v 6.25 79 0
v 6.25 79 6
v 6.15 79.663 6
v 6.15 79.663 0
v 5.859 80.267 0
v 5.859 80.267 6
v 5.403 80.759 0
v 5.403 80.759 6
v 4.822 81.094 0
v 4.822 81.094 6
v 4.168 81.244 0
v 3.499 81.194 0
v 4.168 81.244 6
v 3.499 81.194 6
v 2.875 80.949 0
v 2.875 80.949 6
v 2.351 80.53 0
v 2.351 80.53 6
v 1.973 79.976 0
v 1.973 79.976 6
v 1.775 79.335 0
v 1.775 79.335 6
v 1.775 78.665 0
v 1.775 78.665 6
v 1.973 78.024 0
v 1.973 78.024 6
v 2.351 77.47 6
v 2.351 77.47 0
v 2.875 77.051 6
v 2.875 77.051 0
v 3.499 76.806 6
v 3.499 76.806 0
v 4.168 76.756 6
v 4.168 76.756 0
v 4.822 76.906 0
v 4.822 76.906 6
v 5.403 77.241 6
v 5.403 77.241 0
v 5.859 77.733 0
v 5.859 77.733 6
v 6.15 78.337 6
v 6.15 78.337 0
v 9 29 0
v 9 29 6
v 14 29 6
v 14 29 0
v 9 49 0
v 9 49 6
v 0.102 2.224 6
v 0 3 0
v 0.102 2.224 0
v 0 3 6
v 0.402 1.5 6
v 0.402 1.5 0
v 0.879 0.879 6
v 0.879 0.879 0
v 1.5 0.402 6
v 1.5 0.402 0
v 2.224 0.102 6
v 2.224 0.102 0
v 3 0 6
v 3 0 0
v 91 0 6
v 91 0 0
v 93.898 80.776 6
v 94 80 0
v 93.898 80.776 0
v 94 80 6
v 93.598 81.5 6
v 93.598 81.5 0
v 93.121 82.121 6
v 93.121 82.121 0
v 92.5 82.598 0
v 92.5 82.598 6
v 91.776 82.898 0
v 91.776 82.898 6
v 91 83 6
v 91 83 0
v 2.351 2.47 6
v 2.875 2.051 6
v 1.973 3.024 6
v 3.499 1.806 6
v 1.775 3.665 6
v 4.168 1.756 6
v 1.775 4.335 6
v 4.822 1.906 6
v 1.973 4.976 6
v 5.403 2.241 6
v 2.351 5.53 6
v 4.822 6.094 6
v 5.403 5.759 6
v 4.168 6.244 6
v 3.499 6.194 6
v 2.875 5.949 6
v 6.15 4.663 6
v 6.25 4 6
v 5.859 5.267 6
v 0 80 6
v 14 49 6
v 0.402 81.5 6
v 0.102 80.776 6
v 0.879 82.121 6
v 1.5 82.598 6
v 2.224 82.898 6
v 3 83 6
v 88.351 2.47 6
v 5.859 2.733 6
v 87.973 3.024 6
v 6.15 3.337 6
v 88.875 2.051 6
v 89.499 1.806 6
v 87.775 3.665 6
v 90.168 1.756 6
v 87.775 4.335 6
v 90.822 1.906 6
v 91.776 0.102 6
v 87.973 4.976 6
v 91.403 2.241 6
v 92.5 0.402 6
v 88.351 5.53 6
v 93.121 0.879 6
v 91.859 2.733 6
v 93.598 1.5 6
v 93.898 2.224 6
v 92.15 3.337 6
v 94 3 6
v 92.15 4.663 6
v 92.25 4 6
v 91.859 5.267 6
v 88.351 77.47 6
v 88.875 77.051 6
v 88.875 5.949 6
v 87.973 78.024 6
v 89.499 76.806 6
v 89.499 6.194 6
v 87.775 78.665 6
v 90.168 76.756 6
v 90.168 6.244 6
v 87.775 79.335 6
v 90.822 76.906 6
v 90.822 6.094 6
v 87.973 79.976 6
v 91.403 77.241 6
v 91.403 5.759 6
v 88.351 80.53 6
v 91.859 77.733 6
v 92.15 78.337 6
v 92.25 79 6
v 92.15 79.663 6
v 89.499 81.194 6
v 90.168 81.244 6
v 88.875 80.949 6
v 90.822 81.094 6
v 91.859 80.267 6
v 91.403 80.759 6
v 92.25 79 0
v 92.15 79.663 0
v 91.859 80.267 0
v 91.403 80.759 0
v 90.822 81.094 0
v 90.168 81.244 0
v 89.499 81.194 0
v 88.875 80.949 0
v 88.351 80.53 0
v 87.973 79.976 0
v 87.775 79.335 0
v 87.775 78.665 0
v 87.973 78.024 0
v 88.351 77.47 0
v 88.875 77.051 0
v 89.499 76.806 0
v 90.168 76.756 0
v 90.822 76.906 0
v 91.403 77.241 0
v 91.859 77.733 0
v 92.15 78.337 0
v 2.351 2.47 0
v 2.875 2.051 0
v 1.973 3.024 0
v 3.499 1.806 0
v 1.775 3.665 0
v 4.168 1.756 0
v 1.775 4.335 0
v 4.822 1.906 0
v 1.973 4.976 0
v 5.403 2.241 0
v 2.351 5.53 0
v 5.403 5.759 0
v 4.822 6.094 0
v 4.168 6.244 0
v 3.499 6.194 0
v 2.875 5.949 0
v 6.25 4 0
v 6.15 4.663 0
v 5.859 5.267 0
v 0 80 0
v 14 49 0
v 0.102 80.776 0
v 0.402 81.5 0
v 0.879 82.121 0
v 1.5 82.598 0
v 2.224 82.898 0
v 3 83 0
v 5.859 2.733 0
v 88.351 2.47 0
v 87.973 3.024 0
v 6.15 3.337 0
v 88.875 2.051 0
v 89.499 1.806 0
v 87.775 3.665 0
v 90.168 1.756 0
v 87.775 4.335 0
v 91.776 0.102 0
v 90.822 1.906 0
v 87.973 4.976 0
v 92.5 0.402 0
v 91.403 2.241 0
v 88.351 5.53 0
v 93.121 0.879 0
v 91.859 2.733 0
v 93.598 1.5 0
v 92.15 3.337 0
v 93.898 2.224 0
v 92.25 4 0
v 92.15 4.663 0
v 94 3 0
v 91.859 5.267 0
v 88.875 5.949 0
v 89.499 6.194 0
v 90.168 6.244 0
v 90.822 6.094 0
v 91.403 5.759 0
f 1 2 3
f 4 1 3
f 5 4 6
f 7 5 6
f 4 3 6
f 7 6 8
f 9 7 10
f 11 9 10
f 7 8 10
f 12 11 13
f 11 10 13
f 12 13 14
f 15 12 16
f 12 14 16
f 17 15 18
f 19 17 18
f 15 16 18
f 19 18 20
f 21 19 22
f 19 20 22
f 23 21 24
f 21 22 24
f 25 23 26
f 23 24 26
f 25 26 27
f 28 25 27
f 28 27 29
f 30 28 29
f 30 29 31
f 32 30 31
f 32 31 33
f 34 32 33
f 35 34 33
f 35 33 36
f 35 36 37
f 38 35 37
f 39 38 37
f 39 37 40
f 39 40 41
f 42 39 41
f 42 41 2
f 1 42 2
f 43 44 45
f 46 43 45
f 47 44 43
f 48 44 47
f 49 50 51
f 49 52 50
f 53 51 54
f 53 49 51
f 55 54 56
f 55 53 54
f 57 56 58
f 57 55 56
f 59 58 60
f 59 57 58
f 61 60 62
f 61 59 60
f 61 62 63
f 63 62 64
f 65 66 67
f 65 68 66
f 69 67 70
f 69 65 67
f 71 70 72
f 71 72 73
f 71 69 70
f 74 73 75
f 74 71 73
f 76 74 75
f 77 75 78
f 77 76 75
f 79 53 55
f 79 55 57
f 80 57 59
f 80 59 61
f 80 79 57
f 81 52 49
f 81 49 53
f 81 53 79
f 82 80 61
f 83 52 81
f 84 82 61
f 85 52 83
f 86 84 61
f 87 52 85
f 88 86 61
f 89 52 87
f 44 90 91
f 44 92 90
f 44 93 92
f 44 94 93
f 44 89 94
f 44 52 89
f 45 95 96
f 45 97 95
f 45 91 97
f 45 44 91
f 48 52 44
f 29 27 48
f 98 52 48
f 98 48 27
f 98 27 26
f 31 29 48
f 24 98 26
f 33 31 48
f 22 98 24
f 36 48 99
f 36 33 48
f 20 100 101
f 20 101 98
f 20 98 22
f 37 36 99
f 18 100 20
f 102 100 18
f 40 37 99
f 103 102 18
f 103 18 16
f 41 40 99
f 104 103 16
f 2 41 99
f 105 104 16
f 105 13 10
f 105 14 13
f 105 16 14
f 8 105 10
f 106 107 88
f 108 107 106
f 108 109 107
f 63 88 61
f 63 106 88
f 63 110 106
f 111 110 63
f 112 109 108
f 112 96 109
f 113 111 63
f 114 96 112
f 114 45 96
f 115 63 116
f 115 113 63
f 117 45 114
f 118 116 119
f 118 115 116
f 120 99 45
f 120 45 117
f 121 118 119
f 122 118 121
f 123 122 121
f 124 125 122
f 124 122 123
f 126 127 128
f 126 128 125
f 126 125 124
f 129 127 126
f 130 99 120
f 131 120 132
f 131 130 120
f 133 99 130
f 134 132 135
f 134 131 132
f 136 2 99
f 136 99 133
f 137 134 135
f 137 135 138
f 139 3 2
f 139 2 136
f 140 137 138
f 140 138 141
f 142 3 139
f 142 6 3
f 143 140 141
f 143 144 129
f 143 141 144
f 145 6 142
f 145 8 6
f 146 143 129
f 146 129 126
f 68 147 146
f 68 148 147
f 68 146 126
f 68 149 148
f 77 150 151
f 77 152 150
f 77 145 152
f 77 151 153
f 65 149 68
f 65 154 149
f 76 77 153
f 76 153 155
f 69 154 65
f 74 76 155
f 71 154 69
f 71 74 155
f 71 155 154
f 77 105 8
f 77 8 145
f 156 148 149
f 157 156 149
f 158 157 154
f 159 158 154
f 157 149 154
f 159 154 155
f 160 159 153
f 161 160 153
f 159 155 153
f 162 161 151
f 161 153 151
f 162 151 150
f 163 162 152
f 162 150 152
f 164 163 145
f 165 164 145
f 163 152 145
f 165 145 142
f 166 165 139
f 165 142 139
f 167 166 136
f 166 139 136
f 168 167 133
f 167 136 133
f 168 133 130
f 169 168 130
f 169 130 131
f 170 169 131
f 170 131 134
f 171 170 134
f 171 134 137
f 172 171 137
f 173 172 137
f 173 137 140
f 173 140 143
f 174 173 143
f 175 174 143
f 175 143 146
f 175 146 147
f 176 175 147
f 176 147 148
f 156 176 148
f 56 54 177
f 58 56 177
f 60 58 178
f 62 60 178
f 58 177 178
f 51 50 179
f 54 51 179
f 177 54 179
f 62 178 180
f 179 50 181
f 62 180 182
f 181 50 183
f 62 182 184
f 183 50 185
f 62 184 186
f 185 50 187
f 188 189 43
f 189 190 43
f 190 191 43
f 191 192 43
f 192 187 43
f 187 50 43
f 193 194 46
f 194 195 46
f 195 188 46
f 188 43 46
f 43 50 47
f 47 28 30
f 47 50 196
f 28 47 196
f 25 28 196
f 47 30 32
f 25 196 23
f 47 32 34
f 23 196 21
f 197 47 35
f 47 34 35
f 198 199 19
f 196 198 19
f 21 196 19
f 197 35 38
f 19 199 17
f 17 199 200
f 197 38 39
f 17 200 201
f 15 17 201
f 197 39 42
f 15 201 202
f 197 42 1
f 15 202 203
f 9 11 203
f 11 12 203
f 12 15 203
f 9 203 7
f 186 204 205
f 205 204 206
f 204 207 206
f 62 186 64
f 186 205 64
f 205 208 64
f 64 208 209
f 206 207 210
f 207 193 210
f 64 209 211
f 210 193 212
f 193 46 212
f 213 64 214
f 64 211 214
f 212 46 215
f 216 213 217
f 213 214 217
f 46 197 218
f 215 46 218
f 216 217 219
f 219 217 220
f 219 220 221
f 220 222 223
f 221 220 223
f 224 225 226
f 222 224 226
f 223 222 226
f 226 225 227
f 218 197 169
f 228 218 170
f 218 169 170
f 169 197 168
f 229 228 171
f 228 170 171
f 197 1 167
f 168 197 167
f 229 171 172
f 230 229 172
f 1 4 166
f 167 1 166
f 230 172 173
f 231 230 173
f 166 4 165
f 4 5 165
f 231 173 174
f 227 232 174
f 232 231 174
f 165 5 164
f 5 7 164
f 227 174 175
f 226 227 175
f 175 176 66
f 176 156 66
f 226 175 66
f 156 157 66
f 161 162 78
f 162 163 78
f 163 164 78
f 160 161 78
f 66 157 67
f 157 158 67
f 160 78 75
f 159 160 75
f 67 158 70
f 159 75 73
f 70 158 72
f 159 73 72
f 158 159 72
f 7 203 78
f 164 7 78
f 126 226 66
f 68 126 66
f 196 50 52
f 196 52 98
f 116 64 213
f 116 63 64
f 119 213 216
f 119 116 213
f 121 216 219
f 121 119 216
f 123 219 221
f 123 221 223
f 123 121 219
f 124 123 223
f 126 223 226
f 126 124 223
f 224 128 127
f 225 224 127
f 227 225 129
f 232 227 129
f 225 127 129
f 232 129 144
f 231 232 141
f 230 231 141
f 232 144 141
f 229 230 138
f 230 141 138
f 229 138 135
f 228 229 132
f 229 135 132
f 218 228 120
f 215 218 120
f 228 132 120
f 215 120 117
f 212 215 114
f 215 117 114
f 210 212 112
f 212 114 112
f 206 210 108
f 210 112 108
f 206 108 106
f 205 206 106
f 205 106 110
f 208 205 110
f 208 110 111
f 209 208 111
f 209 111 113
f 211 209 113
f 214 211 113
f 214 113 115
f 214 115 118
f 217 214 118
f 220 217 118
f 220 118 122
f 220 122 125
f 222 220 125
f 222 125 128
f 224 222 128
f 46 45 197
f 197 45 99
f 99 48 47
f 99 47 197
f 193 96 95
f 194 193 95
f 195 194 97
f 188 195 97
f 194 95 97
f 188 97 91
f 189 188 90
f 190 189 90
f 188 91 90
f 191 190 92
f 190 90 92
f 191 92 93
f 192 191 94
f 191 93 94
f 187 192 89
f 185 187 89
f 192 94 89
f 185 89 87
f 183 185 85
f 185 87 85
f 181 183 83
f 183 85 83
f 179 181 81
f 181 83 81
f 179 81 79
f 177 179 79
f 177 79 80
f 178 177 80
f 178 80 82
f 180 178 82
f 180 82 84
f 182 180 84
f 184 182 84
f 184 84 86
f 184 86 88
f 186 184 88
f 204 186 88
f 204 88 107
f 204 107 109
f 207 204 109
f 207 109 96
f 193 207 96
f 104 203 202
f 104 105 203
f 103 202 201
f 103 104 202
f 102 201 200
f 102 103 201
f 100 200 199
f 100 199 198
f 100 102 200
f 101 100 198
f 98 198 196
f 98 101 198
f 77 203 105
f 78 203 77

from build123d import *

# Parameters (mm, degrees)
SKETCH_W        = 94
SKETCH_H        = 83
PAD_DEPTH       = 6
SKETCH001_R     = 2.25
POCKET_DEPTH    = 6.001
FILLET_R        = 3
FILLET001_R     = 3
FILLET002_R     = 3
FILLET003_R     = 3
SKETCH002_W     = 5
SKETCH002_H     = 20
POCKET001_DEPTH = 6.001


with BuildPart() as part:
    # Sketch → Pad (new body)
    with BuildSketch(Plane.XY):
        with Locations((47, 41.5)):
            Rectangle(SKETCH_W, SKETCH_H)
    extrude(amount=PAD_DEPTH)

    # Sketch001 (on Face6 of Pad) → Pocket (cut, through all)
    with BuildSketch(Plane.XY.offset(6)):
        with Locations((4, 79)):
            Circle(SKETCH001_R)
        with Locations((90, 79)):
            Circle(SKETCH001_R)
        with Locations((90, 4)):
            Circle(SKETCH001_R)
        with Locations((4, 4)):
            Circle(SKETCH001_R)
    extrude(amount=-POCKET_DEPTH, mode=Mode.SUBTRACT)

    # Fillet
    fillet_edges = [part.edges().sort_by_distance(p)[0] for p in [
        (94, 0, 3),
    ]]
    fillet(fillet_edges, radius=FILLET_R)

    # Fillet001
    fillet001_edges = [part.edges().sort_by_distance(p)[0] for p in [
        (94, 83, 3),
    ]]
    fillet(fillet001_edges, radius=FILLET001_R)

    # Fillet002
    fillet002_edges = [part.edges().sort_by_distance(p)[0] for p in [
        (0, 83, 3),
    ]]
    fillet(fillet002_edges, radius=FILLET002_R)

    # Fillet003
    fillet003_edges = [part.edges().sort_by_distance(p)[0] for p in [
        (0, 0, 3),
    ]]
    fillet(fillet003_edges, radius=FILLET003_R)

    # Sketch002 (on Face14 of Fillet003) → Pocket001 (cut, through all)
    with BuildSketch(Plane.XY.offset(6)):
        with Locations((11.5, 39)):
            Rectangle(SKETCH002_W, SKETCH002_H)
    extrude(amount=-POCKET001_DEPTH, mode=Mode.SUBTRACT)


solid = part.part
